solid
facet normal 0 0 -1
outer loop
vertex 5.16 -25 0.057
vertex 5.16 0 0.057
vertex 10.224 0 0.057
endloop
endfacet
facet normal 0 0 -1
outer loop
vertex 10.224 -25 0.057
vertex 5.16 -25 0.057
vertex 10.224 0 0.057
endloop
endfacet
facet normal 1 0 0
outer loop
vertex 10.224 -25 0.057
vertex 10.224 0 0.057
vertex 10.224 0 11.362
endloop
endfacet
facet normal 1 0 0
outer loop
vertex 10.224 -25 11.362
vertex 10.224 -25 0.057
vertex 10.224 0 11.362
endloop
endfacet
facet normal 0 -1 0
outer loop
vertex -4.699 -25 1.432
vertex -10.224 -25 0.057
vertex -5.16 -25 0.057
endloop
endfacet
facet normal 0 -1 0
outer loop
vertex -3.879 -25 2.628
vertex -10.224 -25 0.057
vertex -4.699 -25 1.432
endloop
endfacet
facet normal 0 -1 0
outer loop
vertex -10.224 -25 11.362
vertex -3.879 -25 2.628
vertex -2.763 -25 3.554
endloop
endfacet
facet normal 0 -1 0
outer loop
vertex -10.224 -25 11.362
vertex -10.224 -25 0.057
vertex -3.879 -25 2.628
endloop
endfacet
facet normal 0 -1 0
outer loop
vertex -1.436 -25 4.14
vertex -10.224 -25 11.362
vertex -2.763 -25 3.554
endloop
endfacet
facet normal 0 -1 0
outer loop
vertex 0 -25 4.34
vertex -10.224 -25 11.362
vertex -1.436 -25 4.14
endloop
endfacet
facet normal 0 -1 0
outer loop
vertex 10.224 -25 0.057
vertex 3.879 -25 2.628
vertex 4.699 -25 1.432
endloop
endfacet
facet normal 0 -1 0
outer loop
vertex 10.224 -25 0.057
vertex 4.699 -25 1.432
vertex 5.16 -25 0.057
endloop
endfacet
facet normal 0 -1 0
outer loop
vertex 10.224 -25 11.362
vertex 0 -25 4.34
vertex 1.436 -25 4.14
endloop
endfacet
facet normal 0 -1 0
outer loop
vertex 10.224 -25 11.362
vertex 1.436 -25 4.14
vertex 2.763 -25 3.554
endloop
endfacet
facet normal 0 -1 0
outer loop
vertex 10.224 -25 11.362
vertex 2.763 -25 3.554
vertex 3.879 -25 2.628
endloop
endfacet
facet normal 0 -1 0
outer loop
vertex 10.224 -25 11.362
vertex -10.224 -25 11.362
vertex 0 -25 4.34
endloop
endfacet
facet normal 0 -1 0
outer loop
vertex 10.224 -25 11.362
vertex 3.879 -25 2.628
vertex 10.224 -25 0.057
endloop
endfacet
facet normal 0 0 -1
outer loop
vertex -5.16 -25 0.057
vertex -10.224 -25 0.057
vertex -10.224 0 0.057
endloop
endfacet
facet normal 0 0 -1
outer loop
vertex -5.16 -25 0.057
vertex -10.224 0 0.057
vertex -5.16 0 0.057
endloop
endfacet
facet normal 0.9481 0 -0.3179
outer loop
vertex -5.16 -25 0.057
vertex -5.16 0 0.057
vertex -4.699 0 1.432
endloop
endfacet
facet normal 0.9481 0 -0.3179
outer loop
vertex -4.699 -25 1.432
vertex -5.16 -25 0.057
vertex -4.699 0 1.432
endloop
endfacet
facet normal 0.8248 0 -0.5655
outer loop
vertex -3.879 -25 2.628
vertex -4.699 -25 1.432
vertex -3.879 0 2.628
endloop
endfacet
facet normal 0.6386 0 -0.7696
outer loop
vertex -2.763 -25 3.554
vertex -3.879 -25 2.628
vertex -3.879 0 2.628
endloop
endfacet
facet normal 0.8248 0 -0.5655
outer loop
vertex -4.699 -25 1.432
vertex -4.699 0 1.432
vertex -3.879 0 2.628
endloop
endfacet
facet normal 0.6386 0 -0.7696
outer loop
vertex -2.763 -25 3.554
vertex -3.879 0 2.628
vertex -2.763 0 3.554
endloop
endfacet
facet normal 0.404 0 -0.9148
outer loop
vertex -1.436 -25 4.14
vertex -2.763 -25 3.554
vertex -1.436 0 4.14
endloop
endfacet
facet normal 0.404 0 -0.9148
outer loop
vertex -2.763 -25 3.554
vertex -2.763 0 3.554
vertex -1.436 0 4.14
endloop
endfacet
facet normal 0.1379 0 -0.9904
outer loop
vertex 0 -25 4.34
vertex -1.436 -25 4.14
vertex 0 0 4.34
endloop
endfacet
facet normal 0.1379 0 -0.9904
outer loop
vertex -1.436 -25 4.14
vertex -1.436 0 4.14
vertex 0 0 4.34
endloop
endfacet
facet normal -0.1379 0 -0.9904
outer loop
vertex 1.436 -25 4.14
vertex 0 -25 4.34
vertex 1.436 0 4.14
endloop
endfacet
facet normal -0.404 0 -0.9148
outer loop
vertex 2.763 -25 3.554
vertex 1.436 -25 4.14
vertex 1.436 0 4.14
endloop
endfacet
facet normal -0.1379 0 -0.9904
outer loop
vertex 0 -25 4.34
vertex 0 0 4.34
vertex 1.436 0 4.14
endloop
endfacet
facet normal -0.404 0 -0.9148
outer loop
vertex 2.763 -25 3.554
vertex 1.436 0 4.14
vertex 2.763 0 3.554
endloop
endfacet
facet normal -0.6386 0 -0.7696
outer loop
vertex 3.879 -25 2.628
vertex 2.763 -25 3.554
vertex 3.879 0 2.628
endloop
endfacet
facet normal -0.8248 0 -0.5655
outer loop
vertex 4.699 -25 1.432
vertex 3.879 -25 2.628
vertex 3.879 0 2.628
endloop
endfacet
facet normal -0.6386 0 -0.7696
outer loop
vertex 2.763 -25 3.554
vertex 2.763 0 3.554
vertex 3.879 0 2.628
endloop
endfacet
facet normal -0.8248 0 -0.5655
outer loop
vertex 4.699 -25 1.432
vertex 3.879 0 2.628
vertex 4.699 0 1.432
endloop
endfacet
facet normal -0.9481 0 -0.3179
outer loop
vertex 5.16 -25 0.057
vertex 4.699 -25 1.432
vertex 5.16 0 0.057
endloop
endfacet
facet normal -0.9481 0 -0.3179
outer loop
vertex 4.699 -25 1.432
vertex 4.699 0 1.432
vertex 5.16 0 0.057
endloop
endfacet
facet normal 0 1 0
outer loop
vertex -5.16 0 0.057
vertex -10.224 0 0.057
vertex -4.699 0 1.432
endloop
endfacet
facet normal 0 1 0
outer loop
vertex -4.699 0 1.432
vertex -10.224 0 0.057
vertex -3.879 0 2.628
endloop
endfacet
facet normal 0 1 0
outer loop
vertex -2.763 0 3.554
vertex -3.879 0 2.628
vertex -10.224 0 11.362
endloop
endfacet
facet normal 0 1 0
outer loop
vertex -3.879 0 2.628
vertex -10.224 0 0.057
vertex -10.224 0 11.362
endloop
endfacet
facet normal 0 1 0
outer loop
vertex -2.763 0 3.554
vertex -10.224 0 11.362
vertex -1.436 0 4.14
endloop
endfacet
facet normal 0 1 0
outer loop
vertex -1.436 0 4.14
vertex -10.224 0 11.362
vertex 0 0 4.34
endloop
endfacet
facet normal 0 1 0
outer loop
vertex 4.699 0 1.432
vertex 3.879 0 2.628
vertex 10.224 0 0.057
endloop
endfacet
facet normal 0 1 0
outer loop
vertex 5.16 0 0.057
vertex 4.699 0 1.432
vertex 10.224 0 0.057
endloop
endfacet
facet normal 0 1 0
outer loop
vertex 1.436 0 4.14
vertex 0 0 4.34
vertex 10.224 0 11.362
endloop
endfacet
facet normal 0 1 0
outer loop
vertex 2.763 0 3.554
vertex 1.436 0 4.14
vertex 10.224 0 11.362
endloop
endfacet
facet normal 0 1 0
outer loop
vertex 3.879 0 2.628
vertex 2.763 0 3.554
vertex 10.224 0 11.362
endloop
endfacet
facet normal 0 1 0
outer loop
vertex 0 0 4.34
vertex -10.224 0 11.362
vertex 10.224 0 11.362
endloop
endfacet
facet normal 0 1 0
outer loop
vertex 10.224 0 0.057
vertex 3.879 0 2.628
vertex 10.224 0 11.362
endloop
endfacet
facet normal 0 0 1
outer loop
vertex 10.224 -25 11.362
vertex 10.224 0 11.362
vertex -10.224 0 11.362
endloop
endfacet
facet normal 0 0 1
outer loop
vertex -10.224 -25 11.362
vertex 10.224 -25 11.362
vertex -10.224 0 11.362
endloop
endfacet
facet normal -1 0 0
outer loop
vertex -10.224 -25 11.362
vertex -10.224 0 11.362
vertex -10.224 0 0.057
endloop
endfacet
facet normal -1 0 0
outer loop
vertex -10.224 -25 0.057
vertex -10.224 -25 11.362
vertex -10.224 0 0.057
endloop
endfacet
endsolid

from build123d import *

# Parameters (mm, degrees)
F1_DEPTH = 25


with BuildPart() as f1:
    # F0 (on Front) → F1 (new body)
    with BuildSketch(Plane.XZ):
        with BuildLine():
            ThreePointArc((-5.160009, 0.057408), (7.6e-05, 4.339926), (5.160161, 0.057408))
            Line((5.160161, 0.057408), (10.223921, 0.057408))
            Line((10.223921, 0.057408), (10.223921, 11.362204))
            Line((10.223921, 11.362204), (-10.22377, 11.362204))
            Line((-10.22377, 11.362204), (-10.22377, 0.057408))
            Line((-10.22377, 0.057408), (-5.160009, 0.057408))
        make_face()
    extrude(amount=F1_DEPTH)


solid = f1.part
